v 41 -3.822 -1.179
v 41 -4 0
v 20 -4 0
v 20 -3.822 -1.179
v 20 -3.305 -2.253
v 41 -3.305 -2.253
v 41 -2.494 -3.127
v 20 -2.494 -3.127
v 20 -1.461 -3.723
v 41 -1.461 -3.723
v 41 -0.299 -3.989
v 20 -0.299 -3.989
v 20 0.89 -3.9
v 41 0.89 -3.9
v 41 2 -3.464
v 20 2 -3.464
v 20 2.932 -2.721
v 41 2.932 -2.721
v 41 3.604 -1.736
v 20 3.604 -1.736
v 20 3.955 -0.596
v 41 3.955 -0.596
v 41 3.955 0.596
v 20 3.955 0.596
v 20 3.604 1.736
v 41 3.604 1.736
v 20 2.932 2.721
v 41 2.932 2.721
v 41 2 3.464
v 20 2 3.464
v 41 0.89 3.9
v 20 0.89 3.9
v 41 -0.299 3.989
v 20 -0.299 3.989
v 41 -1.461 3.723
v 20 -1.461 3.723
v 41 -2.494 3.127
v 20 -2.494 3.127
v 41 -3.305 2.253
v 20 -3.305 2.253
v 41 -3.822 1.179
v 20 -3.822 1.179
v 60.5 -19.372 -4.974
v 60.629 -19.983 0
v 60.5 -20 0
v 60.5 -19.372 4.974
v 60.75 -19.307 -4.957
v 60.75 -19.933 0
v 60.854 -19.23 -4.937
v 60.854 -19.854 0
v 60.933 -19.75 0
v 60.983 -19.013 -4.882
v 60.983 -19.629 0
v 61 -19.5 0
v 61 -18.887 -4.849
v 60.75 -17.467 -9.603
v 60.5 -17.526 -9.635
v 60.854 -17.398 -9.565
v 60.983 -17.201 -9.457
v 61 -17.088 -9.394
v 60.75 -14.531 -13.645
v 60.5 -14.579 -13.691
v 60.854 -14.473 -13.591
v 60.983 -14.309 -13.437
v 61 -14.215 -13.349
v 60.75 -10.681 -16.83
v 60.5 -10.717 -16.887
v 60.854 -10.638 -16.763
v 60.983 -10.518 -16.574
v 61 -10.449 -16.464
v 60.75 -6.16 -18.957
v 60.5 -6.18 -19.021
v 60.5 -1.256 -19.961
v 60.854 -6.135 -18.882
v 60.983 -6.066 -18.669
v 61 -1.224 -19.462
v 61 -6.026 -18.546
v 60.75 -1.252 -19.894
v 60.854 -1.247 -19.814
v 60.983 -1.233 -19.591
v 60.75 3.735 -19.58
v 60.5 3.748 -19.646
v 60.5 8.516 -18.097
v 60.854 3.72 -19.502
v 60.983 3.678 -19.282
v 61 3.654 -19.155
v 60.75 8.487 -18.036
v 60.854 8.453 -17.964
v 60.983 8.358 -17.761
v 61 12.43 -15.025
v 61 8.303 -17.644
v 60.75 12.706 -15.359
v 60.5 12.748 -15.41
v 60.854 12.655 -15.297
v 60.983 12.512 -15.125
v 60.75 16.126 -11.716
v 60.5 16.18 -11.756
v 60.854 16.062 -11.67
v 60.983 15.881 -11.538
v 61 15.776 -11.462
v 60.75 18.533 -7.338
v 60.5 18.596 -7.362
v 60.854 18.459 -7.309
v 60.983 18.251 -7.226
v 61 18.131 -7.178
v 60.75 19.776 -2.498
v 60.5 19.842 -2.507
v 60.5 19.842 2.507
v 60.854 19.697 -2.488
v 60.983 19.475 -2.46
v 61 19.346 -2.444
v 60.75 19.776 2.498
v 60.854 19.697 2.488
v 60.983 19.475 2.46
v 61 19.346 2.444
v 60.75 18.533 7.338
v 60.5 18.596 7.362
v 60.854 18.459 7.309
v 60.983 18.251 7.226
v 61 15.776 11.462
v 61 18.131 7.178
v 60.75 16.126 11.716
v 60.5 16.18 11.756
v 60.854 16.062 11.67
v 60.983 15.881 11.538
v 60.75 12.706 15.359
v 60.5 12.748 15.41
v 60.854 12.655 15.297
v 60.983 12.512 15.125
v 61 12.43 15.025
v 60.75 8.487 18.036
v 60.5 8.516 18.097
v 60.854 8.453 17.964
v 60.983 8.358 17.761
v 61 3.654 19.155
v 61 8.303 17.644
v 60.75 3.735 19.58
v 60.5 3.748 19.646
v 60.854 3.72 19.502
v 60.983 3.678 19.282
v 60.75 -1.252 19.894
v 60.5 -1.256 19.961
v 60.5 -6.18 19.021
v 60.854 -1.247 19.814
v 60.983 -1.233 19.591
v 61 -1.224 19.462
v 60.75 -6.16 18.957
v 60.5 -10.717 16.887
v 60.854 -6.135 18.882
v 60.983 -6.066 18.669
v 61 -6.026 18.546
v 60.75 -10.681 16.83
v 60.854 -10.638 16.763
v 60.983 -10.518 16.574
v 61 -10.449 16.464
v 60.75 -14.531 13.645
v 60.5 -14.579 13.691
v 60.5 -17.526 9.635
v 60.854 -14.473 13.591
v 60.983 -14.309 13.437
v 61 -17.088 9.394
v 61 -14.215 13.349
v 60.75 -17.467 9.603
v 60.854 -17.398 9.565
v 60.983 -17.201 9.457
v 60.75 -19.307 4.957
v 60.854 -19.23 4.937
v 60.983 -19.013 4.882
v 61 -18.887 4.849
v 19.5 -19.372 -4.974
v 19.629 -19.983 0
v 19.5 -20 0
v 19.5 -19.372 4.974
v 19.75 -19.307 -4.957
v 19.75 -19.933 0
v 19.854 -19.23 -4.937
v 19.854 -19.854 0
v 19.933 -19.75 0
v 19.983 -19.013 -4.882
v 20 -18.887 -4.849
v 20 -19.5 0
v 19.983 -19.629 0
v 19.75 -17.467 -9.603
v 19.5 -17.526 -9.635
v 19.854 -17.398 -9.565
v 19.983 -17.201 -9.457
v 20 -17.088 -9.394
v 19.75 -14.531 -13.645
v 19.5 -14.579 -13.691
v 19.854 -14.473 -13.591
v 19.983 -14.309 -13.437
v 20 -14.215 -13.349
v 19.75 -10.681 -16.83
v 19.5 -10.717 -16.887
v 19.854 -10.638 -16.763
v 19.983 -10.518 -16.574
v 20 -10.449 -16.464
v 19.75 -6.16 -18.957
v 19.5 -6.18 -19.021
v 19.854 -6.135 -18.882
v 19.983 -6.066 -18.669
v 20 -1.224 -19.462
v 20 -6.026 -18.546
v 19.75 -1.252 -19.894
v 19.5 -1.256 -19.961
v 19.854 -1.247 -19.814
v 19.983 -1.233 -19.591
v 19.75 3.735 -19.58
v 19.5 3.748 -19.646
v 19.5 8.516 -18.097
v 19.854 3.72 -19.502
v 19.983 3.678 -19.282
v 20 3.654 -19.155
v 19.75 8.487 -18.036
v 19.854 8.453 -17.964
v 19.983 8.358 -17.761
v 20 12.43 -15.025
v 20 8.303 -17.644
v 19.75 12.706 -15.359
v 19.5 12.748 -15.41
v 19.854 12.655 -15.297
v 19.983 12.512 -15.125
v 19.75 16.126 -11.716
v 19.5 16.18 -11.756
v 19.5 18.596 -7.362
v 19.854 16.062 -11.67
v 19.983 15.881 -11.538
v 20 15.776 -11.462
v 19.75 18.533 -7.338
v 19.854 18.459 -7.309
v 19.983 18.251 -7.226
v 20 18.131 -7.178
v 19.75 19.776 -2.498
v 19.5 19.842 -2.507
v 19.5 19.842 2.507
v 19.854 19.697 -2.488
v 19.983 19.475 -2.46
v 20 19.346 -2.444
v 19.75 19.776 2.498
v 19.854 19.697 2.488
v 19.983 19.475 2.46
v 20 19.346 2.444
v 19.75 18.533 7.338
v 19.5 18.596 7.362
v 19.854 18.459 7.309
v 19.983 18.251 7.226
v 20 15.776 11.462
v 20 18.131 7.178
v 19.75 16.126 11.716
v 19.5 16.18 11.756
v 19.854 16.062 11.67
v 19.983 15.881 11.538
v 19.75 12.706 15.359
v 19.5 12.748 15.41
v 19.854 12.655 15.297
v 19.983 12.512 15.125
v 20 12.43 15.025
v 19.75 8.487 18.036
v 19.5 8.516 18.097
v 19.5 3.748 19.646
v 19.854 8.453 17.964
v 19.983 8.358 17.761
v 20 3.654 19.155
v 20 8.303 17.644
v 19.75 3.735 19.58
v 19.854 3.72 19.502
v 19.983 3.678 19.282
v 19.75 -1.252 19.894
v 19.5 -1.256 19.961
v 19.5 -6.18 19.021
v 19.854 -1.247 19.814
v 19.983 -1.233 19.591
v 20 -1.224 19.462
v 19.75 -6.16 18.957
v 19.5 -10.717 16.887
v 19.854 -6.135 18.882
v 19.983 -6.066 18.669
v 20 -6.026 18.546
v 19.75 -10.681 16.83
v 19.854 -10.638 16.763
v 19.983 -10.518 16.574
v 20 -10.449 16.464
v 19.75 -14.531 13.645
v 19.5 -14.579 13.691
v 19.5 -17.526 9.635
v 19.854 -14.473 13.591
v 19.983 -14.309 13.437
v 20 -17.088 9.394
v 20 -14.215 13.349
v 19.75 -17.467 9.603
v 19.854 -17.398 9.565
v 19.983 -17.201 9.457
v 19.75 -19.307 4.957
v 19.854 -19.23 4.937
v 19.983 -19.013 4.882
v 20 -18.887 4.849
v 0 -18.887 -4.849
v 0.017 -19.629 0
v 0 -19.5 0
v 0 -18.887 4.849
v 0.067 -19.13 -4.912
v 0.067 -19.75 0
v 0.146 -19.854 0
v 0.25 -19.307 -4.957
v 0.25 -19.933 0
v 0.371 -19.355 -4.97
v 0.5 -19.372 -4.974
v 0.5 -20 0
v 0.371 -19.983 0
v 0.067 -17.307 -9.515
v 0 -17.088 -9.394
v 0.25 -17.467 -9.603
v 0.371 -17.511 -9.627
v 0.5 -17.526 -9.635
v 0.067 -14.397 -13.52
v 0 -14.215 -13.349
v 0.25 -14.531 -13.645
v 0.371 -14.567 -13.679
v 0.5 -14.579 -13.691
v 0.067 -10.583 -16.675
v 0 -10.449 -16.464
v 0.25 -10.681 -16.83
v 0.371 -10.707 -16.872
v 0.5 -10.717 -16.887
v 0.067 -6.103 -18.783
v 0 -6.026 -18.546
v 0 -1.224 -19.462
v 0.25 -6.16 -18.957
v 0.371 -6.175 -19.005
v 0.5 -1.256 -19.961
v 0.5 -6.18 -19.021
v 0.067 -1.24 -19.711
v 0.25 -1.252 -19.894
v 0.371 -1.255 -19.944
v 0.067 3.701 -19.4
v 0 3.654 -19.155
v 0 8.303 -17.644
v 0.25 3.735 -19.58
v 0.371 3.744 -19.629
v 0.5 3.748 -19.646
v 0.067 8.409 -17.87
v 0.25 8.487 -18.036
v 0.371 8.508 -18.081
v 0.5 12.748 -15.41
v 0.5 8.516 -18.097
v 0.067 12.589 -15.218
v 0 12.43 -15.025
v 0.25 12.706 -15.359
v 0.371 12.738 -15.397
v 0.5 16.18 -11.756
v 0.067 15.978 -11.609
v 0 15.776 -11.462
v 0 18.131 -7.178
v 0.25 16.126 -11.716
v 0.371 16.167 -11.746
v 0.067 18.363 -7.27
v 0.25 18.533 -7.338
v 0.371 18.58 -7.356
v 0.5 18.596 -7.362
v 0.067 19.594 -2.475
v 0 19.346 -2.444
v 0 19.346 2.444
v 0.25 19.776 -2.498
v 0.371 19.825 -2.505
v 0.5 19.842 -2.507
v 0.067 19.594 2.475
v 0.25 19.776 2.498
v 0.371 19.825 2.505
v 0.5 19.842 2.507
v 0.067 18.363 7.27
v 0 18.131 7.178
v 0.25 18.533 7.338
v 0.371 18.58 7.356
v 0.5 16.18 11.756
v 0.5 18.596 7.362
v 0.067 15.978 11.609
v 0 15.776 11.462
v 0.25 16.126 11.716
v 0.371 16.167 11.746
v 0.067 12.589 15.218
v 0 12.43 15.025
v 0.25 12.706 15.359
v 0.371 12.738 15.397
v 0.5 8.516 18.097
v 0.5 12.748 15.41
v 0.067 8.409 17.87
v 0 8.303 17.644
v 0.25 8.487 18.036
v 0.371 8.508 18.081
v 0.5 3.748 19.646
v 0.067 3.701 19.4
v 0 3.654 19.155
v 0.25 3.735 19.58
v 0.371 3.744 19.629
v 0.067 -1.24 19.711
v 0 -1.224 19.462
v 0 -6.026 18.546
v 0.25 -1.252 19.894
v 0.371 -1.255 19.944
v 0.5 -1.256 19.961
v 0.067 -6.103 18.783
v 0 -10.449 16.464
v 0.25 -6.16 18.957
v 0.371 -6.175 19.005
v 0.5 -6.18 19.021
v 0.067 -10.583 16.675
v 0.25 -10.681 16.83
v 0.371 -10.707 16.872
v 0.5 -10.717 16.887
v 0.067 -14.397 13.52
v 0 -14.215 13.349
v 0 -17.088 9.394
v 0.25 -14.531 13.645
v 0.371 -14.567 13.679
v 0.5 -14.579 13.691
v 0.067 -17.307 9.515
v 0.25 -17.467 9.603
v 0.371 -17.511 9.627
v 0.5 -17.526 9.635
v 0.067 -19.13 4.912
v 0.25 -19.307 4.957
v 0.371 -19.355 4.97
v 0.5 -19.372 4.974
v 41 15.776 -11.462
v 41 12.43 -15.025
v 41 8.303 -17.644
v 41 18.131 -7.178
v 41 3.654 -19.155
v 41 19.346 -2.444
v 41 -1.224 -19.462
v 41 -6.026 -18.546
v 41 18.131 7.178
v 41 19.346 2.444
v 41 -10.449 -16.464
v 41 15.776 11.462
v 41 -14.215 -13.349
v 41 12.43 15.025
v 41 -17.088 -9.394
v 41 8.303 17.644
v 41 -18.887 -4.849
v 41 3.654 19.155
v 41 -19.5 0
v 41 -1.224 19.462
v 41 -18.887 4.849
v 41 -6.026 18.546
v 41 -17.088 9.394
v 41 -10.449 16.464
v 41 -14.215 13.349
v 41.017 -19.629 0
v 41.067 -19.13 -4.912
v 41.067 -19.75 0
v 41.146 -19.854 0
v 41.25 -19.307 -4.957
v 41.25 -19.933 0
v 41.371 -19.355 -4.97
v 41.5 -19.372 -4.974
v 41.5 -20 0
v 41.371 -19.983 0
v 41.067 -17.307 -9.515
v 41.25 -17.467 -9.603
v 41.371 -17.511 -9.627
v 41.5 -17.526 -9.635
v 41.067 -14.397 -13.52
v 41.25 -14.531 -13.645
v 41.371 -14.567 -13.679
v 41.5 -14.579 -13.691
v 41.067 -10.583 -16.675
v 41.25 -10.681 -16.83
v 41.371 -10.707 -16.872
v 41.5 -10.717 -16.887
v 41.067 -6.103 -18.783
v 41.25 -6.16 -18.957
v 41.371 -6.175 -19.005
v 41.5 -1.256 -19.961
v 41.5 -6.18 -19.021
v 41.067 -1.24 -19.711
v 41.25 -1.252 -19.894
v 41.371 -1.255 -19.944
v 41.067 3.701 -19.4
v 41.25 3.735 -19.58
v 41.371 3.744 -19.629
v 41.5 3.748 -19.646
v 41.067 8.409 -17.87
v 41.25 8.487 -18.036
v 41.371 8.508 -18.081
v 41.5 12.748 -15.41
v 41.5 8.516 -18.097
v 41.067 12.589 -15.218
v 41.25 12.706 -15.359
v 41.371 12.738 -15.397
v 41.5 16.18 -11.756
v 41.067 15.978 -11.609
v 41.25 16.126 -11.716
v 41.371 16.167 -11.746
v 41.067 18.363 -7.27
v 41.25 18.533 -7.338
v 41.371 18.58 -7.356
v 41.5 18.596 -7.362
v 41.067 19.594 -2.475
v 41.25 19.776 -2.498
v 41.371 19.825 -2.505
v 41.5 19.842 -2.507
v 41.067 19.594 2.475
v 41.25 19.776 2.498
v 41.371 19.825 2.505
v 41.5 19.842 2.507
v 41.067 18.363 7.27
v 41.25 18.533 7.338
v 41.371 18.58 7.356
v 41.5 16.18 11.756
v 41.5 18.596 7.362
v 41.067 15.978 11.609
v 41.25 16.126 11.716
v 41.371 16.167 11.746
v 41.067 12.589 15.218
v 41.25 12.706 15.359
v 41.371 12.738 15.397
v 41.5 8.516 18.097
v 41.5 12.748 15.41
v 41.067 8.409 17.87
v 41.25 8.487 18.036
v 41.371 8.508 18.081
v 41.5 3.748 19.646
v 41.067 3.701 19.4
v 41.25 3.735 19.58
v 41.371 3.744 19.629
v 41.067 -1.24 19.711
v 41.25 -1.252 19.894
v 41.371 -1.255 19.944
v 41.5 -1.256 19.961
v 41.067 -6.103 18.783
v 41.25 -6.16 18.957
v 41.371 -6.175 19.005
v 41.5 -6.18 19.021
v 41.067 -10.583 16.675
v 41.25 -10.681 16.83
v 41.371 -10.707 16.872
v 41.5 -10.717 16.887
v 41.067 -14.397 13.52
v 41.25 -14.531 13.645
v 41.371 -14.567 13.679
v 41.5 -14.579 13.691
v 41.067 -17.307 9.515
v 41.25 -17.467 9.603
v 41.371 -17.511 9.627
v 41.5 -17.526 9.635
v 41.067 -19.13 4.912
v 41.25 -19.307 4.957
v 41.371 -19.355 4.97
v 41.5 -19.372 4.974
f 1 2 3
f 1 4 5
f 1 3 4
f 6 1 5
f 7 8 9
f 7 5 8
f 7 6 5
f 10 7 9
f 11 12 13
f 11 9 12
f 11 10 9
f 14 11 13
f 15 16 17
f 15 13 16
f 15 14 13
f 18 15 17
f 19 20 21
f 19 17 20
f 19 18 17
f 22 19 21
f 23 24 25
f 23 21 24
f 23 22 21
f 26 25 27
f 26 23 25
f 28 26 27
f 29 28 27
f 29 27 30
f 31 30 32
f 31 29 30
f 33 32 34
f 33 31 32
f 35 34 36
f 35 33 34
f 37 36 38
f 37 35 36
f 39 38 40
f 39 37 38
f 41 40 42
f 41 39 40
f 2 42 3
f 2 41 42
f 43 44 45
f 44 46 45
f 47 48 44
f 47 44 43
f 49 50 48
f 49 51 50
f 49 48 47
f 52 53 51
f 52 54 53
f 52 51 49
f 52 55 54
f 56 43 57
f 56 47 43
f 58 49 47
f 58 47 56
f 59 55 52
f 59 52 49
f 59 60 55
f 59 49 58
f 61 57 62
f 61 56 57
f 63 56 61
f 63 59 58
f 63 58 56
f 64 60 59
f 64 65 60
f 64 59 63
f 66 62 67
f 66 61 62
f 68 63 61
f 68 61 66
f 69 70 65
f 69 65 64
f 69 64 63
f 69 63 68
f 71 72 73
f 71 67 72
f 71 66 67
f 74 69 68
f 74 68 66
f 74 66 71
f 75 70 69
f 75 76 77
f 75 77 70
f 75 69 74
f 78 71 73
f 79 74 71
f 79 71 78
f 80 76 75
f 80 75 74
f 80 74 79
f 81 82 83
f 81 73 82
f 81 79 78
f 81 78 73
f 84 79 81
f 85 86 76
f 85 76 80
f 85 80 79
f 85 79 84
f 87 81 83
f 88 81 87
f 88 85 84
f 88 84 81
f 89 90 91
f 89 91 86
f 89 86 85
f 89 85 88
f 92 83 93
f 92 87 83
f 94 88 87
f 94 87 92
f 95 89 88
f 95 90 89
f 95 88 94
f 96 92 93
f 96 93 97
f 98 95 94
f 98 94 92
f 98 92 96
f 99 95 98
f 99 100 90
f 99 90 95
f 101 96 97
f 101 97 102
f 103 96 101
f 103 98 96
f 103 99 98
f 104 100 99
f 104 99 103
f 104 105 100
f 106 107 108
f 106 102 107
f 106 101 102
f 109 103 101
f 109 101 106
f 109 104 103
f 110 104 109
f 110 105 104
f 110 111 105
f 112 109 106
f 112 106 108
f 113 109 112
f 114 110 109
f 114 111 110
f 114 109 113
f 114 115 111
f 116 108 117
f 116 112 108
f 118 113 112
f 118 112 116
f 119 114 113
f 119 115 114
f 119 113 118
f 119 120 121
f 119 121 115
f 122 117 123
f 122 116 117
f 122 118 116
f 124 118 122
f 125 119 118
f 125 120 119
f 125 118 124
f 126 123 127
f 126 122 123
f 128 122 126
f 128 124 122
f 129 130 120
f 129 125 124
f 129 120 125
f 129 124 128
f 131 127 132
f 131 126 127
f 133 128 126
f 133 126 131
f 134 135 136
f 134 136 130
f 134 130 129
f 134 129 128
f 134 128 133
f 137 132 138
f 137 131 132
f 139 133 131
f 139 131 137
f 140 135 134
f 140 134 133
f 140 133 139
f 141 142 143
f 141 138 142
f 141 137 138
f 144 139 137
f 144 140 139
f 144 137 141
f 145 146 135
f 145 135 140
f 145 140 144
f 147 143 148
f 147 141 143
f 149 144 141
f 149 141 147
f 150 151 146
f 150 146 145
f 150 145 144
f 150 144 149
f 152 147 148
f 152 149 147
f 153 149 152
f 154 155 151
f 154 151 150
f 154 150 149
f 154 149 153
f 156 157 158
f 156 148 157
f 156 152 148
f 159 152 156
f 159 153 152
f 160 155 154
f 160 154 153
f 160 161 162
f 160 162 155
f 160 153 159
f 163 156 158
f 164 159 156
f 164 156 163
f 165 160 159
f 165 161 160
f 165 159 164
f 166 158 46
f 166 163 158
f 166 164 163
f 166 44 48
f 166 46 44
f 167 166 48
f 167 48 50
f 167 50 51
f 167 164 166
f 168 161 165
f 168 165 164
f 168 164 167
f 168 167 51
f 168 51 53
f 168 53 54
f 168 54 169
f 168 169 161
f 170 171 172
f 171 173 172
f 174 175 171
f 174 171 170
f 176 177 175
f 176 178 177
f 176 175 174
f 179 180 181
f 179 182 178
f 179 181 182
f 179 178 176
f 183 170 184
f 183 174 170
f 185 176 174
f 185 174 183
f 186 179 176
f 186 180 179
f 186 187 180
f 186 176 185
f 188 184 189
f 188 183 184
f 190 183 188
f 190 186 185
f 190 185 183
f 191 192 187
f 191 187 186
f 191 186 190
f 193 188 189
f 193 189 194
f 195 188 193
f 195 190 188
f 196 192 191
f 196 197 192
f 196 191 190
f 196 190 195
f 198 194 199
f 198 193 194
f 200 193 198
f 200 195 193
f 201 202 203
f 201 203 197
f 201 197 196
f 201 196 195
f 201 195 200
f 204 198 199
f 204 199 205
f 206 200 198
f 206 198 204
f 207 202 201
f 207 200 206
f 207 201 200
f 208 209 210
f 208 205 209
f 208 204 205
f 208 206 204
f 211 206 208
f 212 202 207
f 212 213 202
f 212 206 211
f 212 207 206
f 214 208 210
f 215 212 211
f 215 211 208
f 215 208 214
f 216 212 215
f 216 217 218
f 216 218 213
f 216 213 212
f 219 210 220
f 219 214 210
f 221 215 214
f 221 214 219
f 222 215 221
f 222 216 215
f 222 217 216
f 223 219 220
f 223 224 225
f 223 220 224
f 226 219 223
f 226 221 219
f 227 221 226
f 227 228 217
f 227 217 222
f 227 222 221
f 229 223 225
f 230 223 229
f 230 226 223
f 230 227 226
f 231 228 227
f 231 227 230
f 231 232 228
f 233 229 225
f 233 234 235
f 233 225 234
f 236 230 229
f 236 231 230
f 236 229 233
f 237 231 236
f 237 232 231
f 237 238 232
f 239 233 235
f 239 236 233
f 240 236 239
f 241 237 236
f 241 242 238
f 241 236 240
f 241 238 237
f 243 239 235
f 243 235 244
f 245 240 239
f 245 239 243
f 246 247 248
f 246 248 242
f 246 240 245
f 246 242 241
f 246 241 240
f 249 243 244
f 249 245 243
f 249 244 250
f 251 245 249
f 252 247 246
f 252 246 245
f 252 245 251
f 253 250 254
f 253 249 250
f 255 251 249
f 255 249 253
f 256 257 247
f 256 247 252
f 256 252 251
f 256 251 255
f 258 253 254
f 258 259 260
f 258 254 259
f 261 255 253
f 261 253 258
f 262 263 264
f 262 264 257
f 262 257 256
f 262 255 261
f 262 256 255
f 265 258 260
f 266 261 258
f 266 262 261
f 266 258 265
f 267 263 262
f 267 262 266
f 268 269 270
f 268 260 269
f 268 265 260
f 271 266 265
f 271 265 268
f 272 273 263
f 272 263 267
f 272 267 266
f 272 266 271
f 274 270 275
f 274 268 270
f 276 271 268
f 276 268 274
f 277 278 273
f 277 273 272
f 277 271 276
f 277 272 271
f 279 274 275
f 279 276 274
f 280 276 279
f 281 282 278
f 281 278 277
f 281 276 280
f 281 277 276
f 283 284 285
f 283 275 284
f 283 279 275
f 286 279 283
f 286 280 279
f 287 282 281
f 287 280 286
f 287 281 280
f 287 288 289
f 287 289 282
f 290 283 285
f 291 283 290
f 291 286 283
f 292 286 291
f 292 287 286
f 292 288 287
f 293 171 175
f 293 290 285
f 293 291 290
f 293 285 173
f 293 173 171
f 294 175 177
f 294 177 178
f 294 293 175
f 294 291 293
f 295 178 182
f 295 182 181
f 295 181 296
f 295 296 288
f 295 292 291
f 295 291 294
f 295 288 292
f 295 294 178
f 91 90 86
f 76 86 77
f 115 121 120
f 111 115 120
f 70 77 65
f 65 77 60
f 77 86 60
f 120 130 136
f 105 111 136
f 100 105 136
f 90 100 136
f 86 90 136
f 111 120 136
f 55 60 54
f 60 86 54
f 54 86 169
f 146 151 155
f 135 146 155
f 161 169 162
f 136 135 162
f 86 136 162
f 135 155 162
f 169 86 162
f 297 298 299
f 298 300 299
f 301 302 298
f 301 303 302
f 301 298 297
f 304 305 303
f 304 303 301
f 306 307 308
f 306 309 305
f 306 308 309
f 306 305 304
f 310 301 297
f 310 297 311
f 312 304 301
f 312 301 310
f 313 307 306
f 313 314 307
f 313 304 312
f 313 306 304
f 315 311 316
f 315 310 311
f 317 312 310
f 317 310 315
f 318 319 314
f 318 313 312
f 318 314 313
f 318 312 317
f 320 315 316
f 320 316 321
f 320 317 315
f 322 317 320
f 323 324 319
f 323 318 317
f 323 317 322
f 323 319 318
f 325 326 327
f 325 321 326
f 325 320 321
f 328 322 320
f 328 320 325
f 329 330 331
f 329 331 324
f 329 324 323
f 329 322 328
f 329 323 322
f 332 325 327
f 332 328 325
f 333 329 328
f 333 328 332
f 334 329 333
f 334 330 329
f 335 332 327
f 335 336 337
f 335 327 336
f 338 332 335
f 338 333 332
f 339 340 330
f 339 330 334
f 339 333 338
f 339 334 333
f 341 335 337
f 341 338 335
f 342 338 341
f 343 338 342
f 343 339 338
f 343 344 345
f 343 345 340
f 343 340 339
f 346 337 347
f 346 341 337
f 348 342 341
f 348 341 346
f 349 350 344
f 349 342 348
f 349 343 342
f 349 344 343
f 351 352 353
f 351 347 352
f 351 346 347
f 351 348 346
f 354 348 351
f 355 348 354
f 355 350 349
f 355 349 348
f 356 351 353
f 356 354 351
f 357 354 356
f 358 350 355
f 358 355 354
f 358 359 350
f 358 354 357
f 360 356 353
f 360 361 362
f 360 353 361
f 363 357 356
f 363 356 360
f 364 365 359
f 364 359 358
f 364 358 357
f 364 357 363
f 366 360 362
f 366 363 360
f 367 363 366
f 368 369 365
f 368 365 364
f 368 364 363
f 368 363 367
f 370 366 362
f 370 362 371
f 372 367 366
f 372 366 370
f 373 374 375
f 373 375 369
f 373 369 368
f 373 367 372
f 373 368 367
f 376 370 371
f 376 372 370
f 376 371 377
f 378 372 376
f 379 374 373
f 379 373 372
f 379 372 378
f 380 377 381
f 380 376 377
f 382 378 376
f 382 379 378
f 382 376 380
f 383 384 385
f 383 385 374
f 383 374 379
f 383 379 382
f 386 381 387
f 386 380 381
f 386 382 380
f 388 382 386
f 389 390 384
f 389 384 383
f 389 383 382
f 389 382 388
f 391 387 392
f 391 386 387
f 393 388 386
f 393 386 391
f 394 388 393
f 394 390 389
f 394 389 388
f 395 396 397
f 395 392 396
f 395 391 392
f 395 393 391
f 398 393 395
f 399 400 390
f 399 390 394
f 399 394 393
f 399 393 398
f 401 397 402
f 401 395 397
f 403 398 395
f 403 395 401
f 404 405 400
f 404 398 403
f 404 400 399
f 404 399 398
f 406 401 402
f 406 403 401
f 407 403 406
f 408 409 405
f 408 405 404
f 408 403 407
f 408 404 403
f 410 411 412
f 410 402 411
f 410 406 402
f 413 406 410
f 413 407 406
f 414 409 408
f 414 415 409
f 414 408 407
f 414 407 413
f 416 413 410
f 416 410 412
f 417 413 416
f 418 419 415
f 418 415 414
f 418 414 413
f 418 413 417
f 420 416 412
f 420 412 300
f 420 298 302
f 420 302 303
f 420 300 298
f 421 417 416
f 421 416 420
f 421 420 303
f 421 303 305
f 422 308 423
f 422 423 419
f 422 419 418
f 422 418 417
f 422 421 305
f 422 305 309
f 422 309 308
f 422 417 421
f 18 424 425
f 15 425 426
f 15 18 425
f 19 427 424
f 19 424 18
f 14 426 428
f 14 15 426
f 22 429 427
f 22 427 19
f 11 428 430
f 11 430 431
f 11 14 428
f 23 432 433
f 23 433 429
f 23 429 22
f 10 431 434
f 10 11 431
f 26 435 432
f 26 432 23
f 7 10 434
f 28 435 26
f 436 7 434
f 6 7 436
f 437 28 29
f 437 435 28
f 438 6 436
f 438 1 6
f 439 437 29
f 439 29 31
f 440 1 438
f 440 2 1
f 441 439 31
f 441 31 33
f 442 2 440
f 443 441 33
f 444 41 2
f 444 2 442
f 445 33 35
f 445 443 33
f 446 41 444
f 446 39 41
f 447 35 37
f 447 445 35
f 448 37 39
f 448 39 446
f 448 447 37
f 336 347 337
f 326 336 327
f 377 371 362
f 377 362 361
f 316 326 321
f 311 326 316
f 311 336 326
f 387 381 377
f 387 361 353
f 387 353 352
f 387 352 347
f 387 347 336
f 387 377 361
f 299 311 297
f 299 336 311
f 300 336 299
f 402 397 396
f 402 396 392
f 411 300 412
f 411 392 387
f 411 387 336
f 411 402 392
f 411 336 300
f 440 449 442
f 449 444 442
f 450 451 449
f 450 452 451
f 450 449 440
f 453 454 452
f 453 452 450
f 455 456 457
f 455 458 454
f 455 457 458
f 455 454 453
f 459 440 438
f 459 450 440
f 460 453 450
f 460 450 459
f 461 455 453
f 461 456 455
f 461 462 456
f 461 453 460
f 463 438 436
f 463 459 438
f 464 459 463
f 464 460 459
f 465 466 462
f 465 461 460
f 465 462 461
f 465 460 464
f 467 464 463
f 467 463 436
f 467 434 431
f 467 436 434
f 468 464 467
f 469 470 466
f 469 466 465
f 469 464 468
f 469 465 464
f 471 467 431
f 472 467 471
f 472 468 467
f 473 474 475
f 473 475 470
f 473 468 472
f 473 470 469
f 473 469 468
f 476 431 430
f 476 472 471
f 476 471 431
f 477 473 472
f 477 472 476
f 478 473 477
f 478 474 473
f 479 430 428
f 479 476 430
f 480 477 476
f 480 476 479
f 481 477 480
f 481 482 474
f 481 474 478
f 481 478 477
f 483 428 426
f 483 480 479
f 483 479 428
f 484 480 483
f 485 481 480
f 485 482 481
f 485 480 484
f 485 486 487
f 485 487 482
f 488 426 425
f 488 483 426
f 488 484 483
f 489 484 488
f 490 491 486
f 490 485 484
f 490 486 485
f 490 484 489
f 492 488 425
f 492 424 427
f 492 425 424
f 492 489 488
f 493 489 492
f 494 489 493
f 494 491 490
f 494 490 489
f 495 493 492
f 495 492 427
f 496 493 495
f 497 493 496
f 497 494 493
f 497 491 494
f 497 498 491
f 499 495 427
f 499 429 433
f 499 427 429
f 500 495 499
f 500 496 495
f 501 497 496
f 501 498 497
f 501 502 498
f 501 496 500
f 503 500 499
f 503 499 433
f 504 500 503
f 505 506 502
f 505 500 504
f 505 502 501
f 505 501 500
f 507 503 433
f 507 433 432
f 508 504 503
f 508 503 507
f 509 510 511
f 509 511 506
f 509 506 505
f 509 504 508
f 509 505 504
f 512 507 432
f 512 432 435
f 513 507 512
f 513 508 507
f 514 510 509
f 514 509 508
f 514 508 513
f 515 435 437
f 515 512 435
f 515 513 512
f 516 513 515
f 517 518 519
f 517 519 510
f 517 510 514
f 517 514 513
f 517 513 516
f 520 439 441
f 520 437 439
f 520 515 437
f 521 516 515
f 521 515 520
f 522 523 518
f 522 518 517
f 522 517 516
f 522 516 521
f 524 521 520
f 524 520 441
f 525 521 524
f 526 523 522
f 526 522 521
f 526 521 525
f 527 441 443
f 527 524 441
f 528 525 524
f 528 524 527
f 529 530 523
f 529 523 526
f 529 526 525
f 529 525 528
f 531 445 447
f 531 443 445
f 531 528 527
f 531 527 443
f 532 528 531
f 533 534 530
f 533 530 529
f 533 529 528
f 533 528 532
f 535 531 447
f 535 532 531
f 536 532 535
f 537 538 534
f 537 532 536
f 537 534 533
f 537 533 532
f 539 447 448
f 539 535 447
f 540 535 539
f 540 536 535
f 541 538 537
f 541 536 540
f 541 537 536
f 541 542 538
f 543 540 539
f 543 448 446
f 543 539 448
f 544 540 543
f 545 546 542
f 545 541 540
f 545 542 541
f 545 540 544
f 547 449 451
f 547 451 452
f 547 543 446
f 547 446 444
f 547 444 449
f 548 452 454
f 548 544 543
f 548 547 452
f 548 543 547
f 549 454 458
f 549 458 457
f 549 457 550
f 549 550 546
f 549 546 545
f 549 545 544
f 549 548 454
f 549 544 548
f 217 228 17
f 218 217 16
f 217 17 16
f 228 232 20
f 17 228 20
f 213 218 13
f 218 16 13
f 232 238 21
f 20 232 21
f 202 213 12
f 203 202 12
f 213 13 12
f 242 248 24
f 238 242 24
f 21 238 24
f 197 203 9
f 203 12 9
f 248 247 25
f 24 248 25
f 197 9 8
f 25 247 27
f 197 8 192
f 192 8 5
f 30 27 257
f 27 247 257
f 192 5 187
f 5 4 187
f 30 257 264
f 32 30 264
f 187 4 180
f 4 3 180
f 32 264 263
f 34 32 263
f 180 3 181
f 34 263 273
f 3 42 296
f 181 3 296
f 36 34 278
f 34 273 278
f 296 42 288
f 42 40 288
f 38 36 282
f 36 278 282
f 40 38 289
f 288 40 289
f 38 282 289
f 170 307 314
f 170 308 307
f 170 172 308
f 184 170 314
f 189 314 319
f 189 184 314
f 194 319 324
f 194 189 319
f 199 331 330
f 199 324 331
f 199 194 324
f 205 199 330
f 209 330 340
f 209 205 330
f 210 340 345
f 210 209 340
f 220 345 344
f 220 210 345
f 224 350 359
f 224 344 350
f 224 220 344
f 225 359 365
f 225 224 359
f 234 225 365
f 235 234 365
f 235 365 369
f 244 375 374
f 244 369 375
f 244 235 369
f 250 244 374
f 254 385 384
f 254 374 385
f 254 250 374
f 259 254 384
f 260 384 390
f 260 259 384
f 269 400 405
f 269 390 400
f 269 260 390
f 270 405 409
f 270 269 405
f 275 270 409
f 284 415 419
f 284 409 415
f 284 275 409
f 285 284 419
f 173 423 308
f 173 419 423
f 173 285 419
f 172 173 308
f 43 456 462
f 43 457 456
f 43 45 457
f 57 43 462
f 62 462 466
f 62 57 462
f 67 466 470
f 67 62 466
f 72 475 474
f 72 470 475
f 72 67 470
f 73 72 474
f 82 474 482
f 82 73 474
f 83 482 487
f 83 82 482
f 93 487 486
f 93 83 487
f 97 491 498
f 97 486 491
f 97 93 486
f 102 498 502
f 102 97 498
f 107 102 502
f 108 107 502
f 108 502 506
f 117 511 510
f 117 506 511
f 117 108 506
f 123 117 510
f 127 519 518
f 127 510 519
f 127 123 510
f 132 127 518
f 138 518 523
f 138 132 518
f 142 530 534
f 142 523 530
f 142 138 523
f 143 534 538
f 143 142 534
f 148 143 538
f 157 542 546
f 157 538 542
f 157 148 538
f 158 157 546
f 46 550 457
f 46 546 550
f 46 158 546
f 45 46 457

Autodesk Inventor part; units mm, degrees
ref_plane "YZ Plane" through (0, 0, 0) normal (1, 0, 0) x (0, 1, 0)
ref_plane "XZ Plane" through (0, 0, 0) normal (0, 1, 0) x (-1, 0, 0)
ref_plane "XY Plane" through (0, 0, 0) normal (0, 0, 1) x (1, 0, 0)
sketch "Náčrt1" plane through (0, 0, 0) normal (0, 0, 1) x (1, 0, 0)
  line L0 (0, 0) -> (0, -19.5)
  line L1 (0.5, -20) -> (19.5, -20)
  line L2 (20, -19.5) -> (20, 0)
  line L3 (20, 0) -> (20, -4)
  line L4 (20, -4) -> (41, -4)
  line L5 (41, -4) -> (41, -19.5)
  line L6 (41.5, -20) -> (60.5, -20)
  line L7 (61, -19.5) -> (61, 0)
  line L8 (61, 0) -> (0, 0)
  arc A0 (41, -19.5) -> (41.5, -20) centre (41.5, -19.5) ccw
  arc A1 (60.5, -20) -> (61, -19.5) centre (60.5, -19.5) ccw
  arc A2 (0, -19.5) -> (0.5, -20) centre (0.5, -19.5) ccw
  arc A3 (19.5, -20) -> (20, -19.5) centre (19.5, -19.5) ccw
  point P0 (0, -20)
  point P1 (20, -20)
  point P2 (41, -20)
  point P3 (61, -20)
  dimension "d0" = 20
  dimension "d1" = 20
  dimension "d2" = 20
  dimension "d3" = 4
  dimension "d4" = 21
  dimension "d5" = 90
  dimension "d6" = 20
  dimension "d7" = 90
  dimension "d9" = 0.5
  dimension "d10" = 0.5
revolve "Rotace1" add sketch "Náčrt1" angle 360 about axis through (61, 0, 0) along (-1, 0, 0)
properties part number "součást 2"
